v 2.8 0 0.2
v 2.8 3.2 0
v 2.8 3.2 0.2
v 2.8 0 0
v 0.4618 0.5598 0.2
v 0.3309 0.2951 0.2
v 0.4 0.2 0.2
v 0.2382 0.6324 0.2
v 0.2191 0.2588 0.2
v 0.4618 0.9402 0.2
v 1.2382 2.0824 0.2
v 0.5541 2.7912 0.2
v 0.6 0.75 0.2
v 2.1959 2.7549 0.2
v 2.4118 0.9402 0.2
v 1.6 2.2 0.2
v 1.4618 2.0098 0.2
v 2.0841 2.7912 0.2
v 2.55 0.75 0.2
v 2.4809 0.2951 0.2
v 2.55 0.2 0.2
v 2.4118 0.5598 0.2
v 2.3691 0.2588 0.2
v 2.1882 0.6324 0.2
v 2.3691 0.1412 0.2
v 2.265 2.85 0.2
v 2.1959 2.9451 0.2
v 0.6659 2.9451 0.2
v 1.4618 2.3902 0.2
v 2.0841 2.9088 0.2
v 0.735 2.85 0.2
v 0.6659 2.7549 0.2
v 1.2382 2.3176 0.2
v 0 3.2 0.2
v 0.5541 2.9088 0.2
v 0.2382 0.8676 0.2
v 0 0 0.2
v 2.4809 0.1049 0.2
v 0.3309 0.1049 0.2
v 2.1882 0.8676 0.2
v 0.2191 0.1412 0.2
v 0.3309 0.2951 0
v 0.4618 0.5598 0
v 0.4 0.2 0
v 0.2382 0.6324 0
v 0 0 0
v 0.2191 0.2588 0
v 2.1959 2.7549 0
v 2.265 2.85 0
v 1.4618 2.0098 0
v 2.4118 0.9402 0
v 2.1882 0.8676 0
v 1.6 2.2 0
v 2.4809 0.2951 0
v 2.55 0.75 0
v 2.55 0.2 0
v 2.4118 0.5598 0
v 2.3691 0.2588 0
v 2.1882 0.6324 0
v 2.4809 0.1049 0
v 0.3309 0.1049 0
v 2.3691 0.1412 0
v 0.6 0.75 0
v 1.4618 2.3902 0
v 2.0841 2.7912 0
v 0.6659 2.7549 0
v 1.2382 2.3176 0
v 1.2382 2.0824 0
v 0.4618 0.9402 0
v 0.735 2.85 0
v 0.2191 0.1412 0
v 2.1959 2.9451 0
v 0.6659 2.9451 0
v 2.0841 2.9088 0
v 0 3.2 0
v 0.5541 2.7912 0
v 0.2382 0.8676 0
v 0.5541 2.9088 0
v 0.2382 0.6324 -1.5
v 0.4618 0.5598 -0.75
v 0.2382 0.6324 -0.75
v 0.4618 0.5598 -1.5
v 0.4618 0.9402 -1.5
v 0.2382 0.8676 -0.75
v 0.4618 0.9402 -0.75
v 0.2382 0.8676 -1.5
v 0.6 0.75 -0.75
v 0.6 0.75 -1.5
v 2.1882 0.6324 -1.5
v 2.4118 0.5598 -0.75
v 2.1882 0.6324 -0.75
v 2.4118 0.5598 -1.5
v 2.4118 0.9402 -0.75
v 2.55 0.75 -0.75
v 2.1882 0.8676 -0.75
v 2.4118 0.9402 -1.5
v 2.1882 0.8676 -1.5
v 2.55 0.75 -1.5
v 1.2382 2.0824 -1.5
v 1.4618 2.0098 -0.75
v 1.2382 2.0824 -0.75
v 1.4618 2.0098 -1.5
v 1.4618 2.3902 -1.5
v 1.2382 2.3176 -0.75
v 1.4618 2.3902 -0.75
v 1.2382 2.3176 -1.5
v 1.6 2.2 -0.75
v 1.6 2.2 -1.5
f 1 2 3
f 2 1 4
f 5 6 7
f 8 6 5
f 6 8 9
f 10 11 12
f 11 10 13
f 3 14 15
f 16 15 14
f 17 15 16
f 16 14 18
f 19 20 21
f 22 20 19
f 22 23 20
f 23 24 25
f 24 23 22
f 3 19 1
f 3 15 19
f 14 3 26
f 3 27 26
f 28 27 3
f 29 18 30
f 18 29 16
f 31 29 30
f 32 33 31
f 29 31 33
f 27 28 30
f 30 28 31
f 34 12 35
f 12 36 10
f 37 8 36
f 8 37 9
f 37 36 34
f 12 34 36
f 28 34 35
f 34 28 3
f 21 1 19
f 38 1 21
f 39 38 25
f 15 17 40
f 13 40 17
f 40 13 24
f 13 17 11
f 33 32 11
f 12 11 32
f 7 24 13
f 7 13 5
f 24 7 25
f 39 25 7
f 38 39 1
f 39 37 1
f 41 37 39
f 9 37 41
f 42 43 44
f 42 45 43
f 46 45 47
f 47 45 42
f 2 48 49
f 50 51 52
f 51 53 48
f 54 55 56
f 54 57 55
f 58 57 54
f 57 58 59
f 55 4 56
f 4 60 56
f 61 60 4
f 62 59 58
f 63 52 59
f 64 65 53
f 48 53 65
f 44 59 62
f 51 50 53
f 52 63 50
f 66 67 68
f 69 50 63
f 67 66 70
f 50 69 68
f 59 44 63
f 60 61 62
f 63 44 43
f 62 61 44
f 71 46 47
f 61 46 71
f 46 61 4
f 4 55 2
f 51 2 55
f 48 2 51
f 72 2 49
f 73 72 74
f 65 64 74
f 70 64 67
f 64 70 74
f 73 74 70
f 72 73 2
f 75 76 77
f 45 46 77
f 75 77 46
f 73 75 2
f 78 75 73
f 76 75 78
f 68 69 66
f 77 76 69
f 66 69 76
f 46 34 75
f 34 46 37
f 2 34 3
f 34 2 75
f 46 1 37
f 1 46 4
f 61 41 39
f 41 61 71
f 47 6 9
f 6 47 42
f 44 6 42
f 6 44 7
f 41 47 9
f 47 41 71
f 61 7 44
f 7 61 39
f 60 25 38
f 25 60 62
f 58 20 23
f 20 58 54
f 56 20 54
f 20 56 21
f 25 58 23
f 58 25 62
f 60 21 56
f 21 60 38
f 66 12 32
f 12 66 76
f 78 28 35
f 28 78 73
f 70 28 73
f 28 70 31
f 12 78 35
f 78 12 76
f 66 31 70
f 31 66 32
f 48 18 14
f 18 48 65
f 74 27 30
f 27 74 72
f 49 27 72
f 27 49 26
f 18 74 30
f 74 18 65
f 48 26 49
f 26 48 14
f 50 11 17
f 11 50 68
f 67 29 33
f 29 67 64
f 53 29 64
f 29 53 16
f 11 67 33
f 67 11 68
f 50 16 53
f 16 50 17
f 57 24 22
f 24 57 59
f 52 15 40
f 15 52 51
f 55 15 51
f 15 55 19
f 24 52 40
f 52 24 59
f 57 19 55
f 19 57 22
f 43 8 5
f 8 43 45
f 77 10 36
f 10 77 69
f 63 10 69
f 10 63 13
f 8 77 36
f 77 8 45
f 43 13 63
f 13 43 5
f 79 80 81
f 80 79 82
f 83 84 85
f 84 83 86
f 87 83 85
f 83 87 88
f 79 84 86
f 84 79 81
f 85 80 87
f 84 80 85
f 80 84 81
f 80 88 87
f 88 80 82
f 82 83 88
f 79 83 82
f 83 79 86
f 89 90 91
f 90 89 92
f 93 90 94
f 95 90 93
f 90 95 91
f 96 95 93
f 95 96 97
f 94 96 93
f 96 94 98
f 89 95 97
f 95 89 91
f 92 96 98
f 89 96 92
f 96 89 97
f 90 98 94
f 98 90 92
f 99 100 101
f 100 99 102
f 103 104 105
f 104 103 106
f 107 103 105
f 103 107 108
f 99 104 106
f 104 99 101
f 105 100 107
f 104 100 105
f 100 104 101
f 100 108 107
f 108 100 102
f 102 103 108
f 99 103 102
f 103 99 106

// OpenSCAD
// file: pegs_and_supports.scad
$fa=1;
$fs=0.4;

////////////////////////////////////////////////
module support_peg() {
    cylinder(h = .75, r = .2);
    //translate([0,0,.3])
    //cylinder(h = .5, r=.4);
}
//translate([.4,.7,-2.1 ])
//support_peg();

////////////////////////////////////////////////
module support_piece() {
    difference() {
        primary_piece();
        
        rotate([90,0,0])
        translate([2.2,4,-3])
        cylinder(h=5, r=1);
               
        translate([1.2, -1.5, 4.2])
        cube([2, 4, 3.6]);
         
        rotate([90,0,0])
        translate([2.2,8,-3])
        cylinder(h=5, r=1);
         
        rotate([90,0,0])
        translate([2.2,11.8,-3])
        cylinder(h=5, r=1);
    } 
}
//support_piece();

module primary_piece() {
    cube([4.4, 1.1, 14]);
    translate([-.8,0,0])
    cube([6,1.1, 2.1]);
}
// main file
$fa=1;
$fs=0.4;

use <pegs_and_supports.scad>

////////////////////////////////////////////////
lidar_tray_width = 2.8;
lidar_tray_length = 3.2;
lidar_tray_height = .2;

lidar_front_pegs = 2.15;
lidar_back_pegs = 1.53;
lidar_front_to_back = 2.65;
lidar_screw_radius = .1;

module lidar_tray() {
    difference() {
        cube([lidar_tray_width, lidar_tray_length, lidar_tray_height]);
        
        // screw pair
        translate([.3, .2, -.5])
        cylinder(h=1, r = lidar_screw_radius);
        
        translate([.3 + lidar_front_pegs, .2, -.5])
        cylinder(h=1, r = lidar_screw_radius);
        
        // screw pair
        translate([1.4 - lidar_back_pegs /2,.2 + lidar_front_to_back, -.5])
        cylinder(h=1, r = lidar_screw_radius);
        
        translate([1.4 + lidar_back_pegs /2, .2 + lidar_front_to_back, -.5])
        cylinder(h=1, r = lidar_screw_radius);
        
        // solitary peg
        translate([lidar_tray_width / 2, lidar_tray_length - 1, -.1])
        cylinder(h=.4, r=.2);
        
        // peg pair
        translate([.2 + lidar_front_pegs, .75, -.1])
        cylinder(h=.4, r=.2);
       
        translate([.4, .75, -.1])
        cylinder(h=.4, r=.2);
    }
    
    translate([.4, .75, -1.5])
    support_peg();

    translate([.2 + lidar_front_pegs, .75, -1.5])
    support_peg();

    translate([lidar_tray_width / 2, lidar_tray_length - 1, -1.5])
    support_peg();
}
lidar_tray();
